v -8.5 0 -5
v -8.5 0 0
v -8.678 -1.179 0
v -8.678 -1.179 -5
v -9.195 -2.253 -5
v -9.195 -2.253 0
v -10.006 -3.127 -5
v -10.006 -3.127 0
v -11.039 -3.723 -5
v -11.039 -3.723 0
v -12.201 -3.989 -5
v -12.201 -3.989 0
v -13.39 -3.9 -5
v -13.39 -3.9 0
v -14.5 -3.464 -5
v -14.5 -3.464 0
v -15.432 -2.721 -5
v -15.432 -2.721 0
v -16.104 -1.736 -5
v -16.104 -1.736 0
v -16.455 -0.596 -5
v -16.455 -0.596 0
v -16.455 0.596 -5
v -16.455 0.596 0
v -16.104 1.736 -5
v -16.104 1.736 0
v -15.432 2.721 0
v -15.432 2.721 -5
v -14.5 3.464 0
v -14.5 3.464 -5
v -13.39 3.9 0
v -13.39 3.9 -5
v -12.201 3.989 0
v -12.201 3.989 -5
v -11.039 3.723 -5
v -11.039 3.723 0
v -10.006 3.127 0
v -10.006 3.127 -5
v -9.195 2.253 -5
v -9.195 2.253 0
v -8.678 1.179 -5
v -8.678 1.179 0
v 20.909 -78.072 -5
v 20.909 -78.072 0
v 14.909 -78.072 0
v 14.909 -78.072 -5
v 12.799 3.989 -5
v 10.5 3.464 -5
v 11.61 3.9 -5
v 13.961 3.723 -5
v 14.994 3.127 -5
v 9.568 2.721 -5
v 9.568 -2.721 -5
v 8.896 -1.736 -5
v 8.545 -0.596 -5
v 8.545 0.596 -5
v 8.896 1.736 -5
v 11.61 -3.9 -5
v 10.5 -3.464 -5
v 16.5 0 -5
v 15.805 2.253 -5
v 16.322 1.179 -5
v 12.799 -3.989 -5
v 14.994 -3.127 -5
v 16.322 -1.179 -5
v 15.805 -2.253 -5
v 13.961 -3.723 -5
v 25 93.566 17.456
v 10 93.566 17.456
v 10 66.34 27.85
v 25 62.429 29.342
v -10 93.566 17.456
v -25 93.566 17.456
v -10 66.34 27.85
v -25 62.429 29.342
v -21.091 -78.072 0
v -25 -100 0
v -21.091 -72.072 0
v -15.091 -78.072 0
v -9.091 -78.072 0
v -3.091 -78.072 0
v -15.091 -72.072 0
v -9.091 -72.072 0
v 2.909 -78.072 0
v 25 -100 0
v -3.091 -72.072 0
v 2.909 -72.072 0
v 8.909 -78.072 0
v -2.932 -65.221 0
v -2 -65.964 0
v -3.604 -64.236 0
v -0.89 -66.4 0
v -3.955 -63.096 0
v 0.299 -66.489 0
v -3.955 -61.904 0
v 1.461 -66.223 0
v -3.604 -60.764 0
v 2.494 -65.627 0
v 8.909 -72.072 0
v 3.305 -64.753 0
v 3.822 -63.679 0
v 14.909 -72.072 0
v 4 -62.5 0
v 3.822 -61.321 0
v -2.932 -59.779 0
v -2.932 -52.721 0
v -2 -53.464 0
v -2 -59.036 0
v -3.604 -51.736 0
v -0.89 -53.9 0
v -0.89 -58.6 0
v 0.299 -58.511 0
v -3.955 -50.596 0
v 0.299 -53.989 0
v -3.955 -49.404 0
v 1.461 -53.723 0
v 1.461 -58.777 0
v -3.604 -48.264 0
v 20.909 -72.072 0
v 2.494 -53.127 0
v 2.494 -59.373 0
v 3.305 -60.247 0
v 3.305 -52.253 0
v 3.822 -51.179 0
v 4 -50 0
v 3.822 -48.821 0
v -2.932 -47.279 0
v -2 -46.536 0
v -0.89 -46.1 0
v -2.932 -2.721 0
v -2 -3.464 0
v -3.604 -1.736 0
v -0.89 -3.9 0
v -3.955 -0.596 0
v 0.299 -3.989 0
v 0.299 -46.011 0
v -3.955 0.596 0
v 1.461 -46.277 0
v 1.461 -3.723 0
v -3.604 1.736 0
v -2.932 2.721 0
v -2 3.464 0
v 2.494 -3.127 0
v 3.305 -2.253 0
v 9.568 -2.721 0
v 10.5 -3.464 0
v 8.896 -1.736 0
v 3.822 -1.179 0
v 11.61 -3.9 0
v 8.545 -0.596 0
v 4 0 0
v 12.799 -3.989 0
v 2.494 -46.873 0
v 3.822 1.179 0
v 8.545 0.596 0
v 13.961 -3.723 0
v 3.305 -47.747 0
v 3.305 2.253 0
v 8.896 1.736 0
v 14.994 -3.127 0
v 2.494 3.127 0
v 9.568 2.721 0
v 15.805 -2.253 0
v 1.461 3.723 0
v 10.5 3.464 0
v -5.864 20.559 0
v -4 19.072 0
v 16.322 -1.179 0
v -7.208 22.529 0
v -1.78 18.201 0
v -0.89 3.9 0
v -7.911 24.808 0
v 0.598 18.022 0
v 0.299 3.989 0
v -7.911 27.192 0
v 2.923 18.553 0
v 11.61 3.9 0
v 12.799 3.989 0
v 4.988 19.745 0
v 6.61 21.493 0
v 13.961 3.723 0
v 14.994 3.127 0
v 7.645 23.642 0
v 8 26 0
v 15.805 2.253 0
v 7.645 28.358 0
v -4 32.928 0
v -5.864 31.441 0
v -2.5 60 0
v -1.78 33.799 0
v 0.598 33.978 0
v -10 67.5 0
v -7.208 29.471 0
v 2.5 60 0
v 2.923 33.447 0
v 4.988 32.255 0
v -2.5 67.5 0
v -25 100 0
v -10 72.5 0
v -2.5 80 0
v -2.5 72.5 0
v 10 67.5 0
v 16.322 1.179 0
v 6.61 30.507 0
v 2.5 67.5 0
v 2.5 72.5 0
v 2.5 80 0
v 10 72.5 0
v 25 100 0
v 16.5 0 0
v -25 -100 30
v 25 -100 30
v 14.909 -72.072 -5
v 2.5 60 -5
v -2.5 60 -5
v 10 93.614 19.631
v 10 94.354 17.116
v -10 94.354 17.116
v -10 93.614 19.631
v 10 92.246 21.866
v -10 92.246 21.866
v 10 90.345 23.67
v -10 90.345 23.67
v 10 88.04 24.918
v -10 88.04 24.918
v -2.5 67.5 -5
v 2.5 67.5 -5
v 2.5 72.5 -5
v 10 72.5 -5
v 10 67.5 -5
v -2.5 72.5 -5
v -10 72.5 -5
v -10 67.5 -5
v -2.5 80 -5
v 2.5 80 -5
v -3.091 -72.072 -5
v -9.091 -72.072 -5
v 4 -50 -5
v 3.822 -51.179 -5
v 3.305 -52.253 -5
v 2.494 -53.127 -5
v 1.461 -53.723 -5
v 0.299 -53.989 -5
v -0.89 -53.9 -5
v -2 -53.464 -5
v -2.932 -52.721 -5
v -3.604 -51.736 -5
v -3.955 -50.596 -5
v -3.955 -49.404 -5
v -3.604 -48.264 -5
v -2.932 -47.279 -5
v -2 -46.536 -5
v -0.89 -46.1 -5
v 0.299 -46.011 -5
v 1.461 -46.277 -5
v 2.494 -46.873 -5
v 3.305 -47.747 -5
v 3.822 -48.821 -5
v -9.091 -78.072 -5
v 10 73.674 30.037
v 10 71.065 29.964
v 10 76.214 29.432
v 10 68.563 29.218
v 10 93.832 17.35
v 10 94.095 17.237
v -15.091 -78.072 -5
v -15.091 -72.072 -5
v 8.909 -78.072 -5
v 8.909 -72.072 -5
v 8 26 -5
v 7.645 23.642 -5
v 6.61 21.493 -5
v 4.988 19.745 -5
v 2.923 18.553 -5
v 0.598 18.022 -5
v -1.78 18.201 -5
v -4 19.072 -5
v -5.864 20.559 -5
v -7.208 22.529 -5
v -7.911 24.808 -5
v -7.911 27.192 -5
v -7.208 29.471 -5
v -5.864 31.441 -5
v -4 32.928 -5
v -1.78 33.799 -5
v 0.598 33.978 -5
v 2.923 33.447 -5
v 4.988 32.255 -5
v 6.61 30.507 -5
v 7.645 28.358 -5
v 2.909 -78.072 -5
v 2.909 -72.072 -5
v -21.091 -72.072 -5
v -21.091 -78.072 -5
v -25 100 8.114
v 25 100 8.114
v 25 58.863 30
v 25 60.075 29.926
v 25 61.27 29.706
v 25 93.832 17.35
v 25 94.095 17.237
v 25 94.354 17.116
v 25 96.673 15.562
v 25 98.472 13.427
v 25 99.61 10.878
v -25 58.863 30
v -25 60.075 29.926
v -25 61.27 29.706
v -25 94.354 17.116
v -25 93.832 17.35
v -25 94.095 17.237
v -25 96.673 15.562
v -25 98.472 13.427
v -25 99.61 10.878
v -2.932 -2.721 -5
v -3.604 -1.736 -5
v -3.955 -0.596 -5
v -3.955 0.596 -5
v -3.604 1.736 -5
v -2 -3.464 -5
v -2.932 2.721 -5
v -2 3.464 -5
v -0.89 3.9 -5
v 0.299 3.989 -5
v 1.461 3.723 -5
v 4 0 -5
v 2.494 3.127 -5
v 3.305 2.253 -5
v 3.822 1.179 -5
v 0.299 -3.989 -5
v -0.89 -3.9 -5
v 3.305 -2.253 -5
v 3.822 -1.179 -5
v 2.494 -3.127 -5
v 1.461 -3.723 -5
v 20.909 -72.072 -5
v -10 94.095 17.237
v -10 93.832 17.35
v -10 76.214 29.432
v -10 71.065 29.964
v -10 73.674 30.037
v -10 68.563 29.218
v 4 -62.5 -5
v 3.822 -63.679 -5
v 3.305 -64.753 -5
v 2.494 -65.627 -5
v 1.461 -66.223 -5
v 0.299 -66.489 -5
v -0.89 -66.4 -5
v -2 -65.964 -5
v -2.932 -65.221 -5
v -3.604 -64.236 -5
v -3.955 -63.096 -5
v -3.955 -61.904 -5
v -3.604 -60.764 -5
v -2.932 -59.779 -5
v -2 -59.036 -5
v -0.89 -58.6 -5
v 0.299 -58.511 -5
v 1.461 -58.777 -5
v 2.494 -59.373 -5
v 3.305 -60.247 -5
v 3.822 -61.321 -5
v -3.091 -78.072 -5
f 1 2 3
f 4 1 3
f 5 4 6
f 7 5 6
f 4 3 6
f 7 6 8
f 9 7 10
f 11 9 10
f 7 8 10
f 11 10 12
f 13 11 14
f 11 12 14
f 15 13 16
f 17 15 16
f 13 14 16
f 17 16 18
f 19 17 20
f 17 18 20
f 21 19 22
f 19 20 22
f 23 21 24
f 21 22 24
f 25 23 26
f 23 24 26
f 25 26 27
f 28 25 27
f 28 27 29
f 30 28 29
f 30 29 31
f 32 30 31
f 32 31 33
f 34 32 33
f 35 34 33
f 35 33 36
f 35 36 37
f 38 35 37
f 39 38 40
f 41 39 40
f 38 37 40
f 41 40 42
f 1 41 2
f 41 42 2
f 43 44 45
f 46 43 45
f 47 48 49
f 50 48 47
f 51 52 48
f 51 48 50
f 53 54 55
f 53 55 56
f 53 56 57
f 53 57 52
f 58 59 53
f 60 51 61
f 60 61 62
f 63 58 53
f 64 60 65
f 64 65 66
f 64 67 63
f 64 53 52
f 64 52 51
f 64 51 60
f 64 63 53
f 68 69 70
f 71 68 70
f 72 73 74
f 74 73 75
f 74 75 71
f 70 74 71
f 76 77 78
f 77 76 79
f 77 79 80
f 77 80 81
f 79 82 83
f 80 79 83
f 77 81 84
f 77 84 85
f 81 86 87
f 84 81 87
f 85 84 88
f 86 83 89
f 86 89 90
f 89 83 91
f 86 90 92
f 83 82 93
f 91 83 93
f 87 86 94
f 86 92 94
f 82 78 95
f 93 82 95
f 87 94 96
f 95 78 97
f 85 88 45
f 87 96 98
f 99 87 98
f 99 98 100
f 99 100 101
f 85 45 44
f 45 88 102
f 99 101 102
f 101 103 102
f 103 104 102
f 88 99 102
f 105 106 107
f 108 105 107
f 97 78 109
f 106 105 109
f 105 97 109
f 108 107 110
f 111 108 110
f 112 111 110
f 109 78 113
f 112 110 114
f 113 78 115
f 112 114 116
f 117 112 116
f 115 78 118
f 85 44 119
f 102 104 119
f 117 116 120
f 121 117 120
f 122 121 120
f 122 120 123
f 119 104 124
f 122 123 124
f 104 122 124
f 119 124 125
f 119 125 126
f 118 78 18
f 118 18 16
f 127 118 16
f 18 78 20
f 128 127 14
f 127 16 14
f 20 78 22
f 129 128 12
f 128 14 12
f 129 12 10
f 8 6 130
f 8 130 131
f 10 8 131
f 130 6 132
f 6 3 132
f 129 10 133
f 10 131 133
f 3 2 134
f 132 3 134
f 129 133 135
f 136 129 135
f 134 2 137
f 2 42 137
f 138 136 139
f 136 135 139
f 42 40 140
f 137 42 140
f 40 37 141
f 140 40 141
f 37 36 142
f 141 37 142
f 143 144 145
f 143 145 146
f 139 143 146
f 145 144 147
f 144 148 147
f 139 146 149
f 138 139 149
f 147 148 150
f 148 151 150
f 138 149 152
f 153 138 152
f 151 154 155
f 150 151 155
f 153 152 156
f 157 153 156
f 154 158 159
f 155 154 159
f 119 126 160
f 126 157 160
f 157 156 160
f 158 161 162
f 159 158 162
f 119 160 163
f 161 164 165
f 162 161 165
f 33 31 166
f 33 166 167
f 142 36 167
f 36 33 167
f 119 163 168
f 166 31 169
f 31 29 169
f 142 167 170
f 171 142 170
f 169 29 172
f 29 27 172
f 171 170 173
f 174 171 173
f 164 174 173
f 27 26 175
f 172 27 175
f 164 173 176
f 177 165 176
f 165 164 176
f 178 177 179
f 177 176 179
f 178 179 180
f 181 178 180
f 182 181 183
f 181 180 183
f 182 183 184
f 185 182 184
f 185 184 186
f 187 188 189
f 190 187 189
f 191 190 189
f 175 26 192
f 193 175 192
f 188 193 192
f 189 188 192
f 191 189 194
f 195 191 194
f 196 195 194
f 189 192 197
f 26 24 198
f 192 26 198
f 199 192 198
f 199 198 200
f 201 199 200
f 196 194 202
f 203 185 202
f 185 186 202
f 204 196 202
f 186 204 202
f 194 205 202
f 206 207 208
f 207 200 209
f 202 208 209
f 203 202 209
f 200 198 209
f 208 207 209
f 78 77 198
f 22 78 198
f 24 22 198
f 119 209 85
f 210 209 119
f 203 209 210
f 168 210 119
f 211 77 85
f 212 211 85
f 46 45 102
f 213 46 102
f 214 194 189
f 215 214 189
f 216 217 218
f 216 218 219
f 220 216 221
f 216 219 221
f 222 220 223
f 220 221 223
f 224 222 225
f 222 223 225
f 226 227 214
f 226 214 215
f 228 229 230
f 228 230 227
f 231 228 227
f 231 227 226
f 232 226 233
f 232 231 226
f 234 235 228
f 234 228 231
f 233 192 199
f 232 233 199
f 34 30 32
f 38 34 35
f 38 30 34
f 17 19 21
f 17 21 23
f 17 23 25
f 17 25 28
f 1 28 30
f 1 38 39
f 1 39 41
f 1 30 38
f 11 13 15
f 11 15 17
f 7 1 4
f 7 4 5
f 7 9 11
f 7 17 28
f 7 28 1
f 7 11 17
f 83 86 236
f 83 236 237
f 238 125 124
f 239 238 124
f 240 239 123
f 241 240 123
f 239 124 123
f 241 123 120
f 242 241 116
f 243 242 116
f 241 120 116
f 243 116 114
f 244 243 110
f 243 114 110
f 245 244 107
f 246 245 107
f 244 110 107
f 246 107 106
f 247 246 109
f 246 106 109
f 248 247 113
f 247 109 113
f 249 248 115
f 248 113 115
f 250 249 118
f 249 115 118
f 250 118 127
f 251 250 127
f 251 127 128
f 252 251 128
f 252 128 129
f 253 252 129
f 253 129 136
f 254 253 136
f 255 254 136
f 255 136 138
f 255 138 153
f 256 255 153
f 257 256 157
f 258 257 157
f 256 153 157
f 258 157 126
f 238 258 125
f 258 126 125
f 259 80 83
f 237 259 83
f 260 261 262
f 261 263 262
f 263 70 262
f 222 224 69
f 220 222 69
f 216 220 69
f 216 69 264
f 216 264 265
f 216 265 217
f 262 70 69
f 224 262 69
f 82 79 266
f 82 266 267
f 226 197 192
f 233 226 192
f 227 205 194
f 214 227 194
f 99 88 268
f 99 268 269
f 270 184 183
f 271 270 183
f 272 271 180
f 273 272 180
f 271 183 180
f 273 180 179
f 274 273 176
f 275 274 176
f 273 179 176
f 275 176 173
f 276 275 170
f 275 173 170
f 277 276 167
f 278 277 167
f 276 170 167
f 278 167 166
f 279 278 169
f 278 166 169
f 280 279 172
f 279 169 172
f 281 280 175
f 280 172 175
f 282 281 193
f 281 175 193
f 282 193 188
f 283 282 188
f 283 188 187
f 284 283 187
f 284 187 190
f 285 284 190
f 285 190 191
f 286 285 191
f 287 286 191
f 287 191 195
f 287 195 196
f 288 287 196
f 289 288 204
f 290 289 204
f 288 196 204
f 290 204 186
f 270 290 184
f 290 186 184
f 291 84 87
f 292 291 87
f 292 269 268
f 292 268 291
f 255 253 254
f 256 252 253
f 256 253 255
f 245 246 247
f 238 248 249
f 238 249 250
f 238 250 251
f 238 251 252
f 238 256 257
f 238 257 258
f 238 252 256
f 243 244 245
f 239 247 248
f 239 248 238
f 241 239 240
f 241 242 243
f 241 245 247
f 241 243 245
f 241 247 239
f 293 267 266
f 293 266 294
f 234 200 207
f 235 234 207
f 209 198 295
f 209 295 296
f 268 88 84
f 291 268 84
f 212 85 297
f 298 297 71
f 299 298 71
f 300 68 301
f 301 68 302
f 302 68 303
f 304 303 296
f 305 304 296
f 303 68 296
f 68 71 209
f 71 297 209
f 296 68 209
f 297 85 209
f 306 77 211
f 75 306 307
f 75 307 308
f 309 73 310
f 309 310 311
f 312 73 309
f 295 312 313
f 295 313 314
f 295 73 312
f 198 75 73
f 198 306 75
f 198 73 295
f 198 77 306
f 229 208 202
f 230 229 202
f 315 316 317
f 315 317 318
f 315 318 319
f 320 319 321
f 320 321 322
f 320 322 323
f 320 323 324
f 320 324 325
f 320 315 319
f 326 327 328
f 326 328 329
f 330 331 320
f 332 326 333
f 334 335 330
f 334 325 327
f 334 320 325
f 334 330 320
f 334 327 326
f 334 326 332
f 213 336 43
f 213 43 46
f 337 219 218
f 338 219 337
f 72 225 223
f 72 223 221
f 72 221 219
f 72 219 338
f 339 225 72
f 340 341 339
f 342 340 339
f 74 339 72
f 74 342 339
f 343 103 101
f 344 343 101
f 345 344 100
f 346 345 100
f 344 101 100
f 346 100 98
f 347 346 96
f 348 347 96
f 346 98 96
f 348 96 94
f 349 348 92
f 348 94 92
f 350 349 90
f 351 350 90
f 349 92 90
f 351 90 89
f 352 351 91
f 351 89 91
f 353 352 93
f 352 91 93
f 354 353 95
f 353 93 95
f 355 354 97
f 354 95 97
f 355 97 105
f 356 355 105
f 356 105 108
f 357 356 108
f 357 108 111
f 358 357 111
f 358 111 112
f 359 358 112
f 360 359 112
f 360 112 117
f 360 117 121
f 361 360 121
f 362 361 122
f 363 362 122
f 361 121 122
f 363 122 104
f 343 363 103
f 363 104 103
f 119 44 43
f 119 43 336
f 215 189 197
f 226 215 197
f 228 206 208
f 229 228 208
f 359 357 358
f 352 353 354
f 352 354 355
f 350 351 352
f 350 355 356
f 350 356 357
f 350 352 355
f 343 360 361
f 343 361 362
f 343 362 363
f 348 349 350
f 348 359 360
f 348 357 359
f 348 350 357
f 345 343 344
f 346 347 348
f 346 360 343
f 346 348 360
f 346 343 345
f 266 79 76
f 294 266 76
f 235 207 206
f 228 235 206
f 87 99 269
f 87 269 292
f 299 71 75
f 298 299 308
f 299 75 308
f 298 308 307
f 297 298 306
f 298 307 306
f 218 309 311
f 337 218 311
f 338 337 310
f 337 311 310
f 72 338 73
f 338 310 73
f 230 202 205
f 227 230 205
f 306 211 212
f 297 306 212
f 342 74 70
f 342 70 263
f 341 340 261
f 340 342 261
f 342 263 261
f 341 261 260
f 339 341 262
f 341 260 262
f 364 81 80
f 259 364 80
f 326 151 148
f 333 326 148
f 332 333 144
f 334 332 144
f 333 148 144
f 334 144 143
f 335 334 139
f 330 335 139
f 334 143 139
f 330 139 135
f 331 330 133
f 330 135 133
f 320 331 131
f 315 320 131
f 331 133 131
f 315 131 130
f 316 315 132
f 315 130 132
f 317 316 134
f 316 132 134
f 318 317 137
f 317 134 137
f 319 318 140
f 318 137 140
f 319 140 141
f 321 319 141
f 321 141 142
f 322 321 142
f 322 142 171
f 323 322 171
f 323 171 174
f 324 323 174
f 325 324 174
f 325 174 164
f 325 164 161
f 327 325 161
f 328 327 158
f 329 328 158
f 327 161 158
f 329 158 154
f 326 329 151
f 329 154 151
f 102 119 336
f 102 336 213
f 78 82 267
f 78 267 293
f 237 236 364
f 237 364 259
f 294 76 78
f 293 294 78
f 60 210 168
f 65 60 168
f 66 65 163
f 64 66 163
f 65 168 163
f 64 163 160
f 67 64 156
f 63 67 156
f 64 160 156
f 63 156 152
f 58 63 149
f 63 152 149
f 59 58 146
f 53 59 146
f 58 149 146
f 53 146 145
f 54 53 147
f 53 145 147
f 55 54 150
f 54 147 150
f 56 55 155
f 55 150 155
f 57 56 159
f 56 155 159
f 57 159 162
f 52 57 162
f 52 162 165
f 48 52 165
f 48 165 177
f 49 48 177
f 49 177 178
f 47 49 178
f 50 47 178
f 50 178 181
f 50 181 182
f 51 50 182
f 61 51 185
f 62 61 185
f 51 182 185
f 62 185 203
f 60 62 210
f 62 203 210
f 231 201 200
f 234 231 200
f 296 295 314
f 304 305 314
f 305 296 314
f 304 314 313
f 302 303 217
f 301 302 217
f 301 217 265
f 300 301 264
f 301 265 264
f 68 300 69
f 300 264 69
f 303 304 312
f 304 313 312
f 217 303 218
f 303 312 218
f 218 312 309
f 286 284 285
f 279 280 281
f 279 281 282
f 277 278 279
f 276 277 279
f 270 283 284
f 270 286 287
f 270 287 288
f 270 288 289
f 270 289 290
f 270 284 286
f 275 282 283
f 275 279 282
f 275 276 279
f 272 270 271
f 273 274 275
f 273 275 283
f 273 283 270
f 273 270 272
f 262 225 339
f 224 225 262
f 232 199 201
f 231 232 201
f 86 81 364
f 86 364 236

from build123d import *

# Parameters (mm, degrees)
CROQUIS1_W              = 50
CROQUIS1_H              = 200
SALIENTE_EXTRUIR1_DEPTH = 30
CORTAR_EXTRUIR1_DEPTH   = 60
CROQUIS3_W              = 20
CROQUIS3_H              = 30
SALIENTE_EXTRUIR2_DEPTH = 5
REDONDEO1_R             = 10
REDONDEO2_R             = 10
CROQUIS5_W              = 6
CROQUIS5_H              = 6
CROQUIS5_R              = 8
CROQUIS5_R_2            = 4
SALIENTE_EXTRUIR3_DEPTH = 5


with BuildPart() as part:
    # Croquis1 → Saliente-Extruir1 (new body)
    with BuildSketch(Plane.XY):
        Rectangle(CROQUIS1_W, CROQUIS1_H)
    extrude(amount=SALIENTE_EXTRUIR1_DEPTH)

    # Croquis2 → Cortar-Extruir1 (cut)
    with BuildSketch(Plane.ZY.offset(25)):
        Polygon((15, 100), (30, 60.706463385), (30, 100), align=None)
    extrude(amount=-CORTAR_EXTRUIR1_DEPTH, mode=Mode.SUBTRACT)

    # Croquis3 → Saliente-Extruir2 (add)
    with BuildSketch(Plane(origin=(0, 17.716995079, 46.41089299), x_dir=(1, 0, 0), z_dir=(0, 0.356639588239418, 0.9342420479192843))):
        with Locations((0, 67.044976998)):
            Rectangle(CROQUIS3_W, CROQUIS3_H)
    extrude(amount=SALIENTE_EXTRUIR2_DEPTH)

    # Redondeo1
    # the kernel refuses this fillet: 10 mm, written as the material it takes off along each edge
    with BuildSketch(Plane(origin=(-29.60955221, 60.706463385, 30), x_dir=(0, -1, 0), z_dir=(1, 0, 0))) as redondeo1_piece_1:
        with BuildLine():
            CenterArc((REDONDEO1_R * 0.184382088386, REDONDEO1_R), REDONDEO1_R, 249.106035538, 20.893964462)
            Line((-REDONDEO1_R * 0.172257499853, REDONDEO1_R * 0.0657579520807), (0, 0))
            Line((0, 0), (REDONDEO1_R * 0.184382088386, 0))
        make_face()
    extrude(amount=59.219104419, mode=Mode.SUBTRACT)
    with BuildSketch(Plane(origin=(-42.216106179, 100, 15), x_dir=(0, -0.934242047919284, 0.3566395882394187), z_dir=(1, 0, 0))) as redondeo1_piece_2_section:
        with BuildLine():
            CenterArc((REDONDEO1_R * 0.688644247166, REDONDEO1_R), REDONDEO1_R, 200.893964462, 69.106035538)
            Line((-REDONDEO1_R * 0.245597800753, REDONDEO1_R * 0.643360411761), (0, 0))
            Line((0, 0), (REDONDEO1_R * 0.688644247166, 0))
        make_face()
    redondeo1_piece_2 = extrude(amount=84.432212358, mode=Mode.PRIVATE)
    redondeo1_piece_2 = split(redondeo1_piece_2, bisect_by=Plane(origin=(-10, 94.011560914, 17.386219939), z_dir=(-1, 0, 0)), keep=Keep.TOP, mode=Mode.PRIVATE)
    redondeo1_piece_2 = split(redondeo1_piece_2, bisect_by=Plane(origin=(-26.10805309, 94.400241221, 17.237844274), z_dir=(0, -0.9342420479192843, 0.35663958823941805)), keep=Keep.TOP, mode=Mode.PRIVATE)
    add(redondeo1_piece_2, mode=Mode.SUBTRACT)
    with BuildSketch(Plane(origin=(-42.216106179, 100, 15), x_dir=(0, -0.934242047919284, 0.3566395882394187), z_dir=(1, 0, 0))) as redondeo1_piece_3_section:
        with BuildLine():
            CenterArc((REDONDEO1_R * 0.688644247166, REDONDEO1_R), REDONDEO1_R, 200.893964462, 69.106035538)
            Line((-REDONDEO1_R * 0.245597800753, REDONDEO1_R * 0.643360411761), (0, 0))
            Line((0, 0), (REDONDEO1_R * 0.688644247166, 0))
        make_face()
    redondeo1_piece_3 = extrude(amount=84.432212358, mode=Mode.PRIVATE)
    redondeo1_piece_3 = split(redondeo1_piece_3, bisect_by=Plane(origin=(-10, 98.665500542, 13.974903393), z_dir=(-1, 0, 0)), keep=Keep.TOP, mode=Mode.PRIVATE)
    redondeo1_piece_3 = split(redondeo1_piece_3, bisect_by=Plane(origin=(-26.10805309, 93.855575449, 15.811054644), z_dir=(0, 0.9342420479192843, -0.35663958823941805)), keep=Keep.TOP, mode=Mode.PRIVATE)
    add(redondeo1_piece_3, mode=Mode.SUBTRACT)
    with BuildSketch(Plane(origin=(-42.216106179, 100, 15), x_dir=(0, -0.934242047919284, 0.3566395882394187), z_dir=(1, 0, 0))) as redondeo1_piece_4_section:
        with BuildLine():
            CenterArc((REDONDEO1_R * 0.688644247166, REDONDEO1_R), REDONDEO1_R, 200.893964462, 69.106035538)
            Line((-REDONDEO1_R * 0.245597800753, REDONDEO1_R * 0.643360411761), (0, 0))
            Line((0, 0), (REDONDEO1_R * 0.688644247166, 0))
        make_face()
    redondeo1_piece_4 = extrude(amount=84.432212358, mode=Mode.PRIVATE)
    redondeo1_piece_4 = split(redondeo1_piece_4, bisect_by=Plane(origin=(-10, 98.665500542, 13.974903393), z_dir=(1, 0, 0)), keep=Keep.TOP, mode=Mode.PRIVATE)
    redondeo1_piece_4 = split(redondeo1_piece_4, bisect_by=Plane(origin=(0, 93.855575449, 15.811054644), z_dir=(0, 0.9342420479192843, -0.35663958823941805)), keep=Keep.TOP, mode=Mode.PRIVATE)
    redondeo1_piece_4 = split(redondeo1_piece_4, bisect_by=Plane(origin=(10, 98.665500542, 13.974903393), z_dir=(-1, 0, 0)), keep=Keep.TOP, mode=Mode.PRIVATE)
    add(redondeo1_piece_4, mode=Mode.SUBTRACT)
    with BuildSketch(Plane(origin=(-42.216106179, 100, 15), x_dir=(0, -0.934242047919284, 0.3566395882394187), z_dir=(1, 0, 0))) as redondeo1_piece_5_section:
        with BuildLine():
            CenterArc((REDONDEO1_R * 0.688644247166, REDONDEO1_R), REDONDEO1_R, 200.893964462, 69.106035538)
            Line((-REDONDEO1_R * 0.245597800753, REDONDEO1_R * 0.643360411761), (0, 0))
            Line((0, 0), (REDONDEO1_R * 0.688644247166, 0))
        make_face()
    redondeo1_piece_5 = extrude(amount=84.432212358, mode=Mode.PRIVATE)
    redondeo1_piece_5 = split(redondeo1_piece_5, bisect_by=Plane(origin=(26.10805309, 94.400241221, 17.237844274), z_dir=(0, -0.9342420479192843, 0.35663958823941805)), keep=Keep.TOP, mode=Mode.PRIVATE)
    redondeo1_piece_5 = split(redondeo1_piece_5, bisect_by=Plane(origin=(10, 94.011560914, 17.386219939), z_dir=(1, 0, 0)), keep=Keep.TOP, mode=Mode.PRIVATE)
    add(redondeo1_piece_5, mode=Mode.SUBTRACT)
    with BuildSketch(Plane(origin=(-42.216106179, 100, 15), x_dir=(0, -0.934242047919284, 0.3566395882394187), z_dir=(1, 0, 0))) as redondeo1_piece_6_section:
        with BuildLine():
            CenterArc((REDONDEO1_R * 0.688644247166, REDONDEO1_R), REDONDEO1_R, 200.893964462, 69.106035538)
            Line((-REDONDEO1_R * 0.245597800753, REDONDEO1_R * 0.643360411761), (0, 0))
            Line((0, 0), (REDONDEO1_R * 0.688644247166, 0))
        make_face()
    redondeo1_piece_6 = extrude(amount=84.432212358, mode=Mode.PRIVATE)
    redondeo1_piece_6 = split(redondeo1_piece_6, bisect_by=Plane(origin=(26.10805309, 93.855575449, 15.811054644), z_dir=(0, 0.9342420479192843, -0.35663958823941805)), keep=Keep.TOP, mode=Mode.PRIVATE)
    redondeo1_piece_6 = split(redondeo1_piece_6, bisect_by=Plane(origin=(10, 98.665500542, 13.974903393), z_dir=(1, 0, 0)), keep=Keep.TOP, mode=Mode.PRIVATE)
    add(redondeo1_piece_6, mode=Mode.SUBTRACT)

    # Redondeo2
    # the kernel refuses this fillet: 10 mm, written as the material it takes off along each edge
    with BuildSketch(Plane(origin=(31.650635095, 68.122798915, 32.520804063), x_dir=(0, 0.9342420479192848, -0.3566395882394171), z_dir=(-1, 0, 0))) as redondeo2_piece_1:
        with BuildLine():
            CenterArc((8.660254038, 10), REDONDEO2_R, 210, 60)
            Line((0, 5), (-0.173205081, 4.9))
            ThreePointArc((-0.173205081, 4.9), (-0.2, 2.5), (-0.2, 0))
            Line((-0.2, 0), (0, -0.2))
            Line((0, -0.2), (8.660254038, -0.2))
            Line((8.660254038, -0.2), (8.660254038, 0))
        make_face()
    extrude(amount=63.301270189, mode=Mode.SUBTRACT)
    with BuildSketch(Plane(origin=(-31.703453679, 96.150060353, 21.821616416), x_dir=(0, -0.3566395882395135, -0.9342420479192478), z_dir=(1, 0, 0))) as redondeo2_piece_2:
        with BuildLine():
            CenterArc((10, -8.681381471), REDONDEO2_R, 119.757004223, 60.242995777)
            Line((0, -8.681381471), (-0.2, -8.681381471))
            Line((-0.2, -8.681381471), (-0.2, 0))
            Line((-0.2, 0), (0, 0.2))
            ThreePointArc((0, 0.2), (2.518386828, 0.2), (4.937509129, 0.173627629))
            Line((4.937509129, 0.173627629), (5.036773655, 0))
        make_face()
    extrude(amount=63.406907357, mode=Mode.SUBTRACT)

    # Croquis5 → Saliente-Extruir3 (add)
    with BuildSketch(Plane(origin=(0, 0, 0), x_dir=(-1, 0, 0), z_dir=(0, 0, -1))):
        Polygon((-2.5, 80), (-2.5, 72.5), (-10, 72.5), (-10, 67.5), (-2.5, 67.5), (-2.5, 60), (2.5, 60), (2.5, 67.5), (10, 67.5), (10, 72.5), (2.5, 72.5), (2.5, 80), align=None)
        with Locations((-17.908573371, -75.072215566)):
            Rectangle(CROQUIS5_W, CROQUIS5_H)
        with Locations((18.091426629, -75.072215566)):
            Rectangle(CROQUIS5_W, CROQUIS5_H)
        with Locations((-5.908573371, -75.072215566)):
            Rectangle(CROQUIS5_W, CROQUIS5_H)
        with Locations((6.091426629, -75.072215566)):
            Rectangle(CROQUIS5_W, CROQUIS5_H)
        with Locations(Location((0, 26, 0), (0, 0, 180))):
            Circle(CROQUIS5_R)
        with Locations(Location((0, 0, 0), (0, 0, 180))):
            Circle(CROQUIS5_R_2)
        with Locations(Location((-12.5, 0, 0), (0, 0, 180))):
            Circle(CROQUIS5_R_2)
        with Locations(Location((12.5, 0, 0), (0, 0, 180))):
            Circle(CROQUIS5_R_2)
        with Locations(Location((0, -50, 0), (0, 0, 180))):
            Circle(CROQUIS5_R_2)
        with Locations(Location((0, -62.5, 0), (0, 0, 180))):
            Circle(CROQUIS5_R_2)
    extrude(amount=SALIENTE_EXTRUIR3_DEPTH)


solid = part.part
